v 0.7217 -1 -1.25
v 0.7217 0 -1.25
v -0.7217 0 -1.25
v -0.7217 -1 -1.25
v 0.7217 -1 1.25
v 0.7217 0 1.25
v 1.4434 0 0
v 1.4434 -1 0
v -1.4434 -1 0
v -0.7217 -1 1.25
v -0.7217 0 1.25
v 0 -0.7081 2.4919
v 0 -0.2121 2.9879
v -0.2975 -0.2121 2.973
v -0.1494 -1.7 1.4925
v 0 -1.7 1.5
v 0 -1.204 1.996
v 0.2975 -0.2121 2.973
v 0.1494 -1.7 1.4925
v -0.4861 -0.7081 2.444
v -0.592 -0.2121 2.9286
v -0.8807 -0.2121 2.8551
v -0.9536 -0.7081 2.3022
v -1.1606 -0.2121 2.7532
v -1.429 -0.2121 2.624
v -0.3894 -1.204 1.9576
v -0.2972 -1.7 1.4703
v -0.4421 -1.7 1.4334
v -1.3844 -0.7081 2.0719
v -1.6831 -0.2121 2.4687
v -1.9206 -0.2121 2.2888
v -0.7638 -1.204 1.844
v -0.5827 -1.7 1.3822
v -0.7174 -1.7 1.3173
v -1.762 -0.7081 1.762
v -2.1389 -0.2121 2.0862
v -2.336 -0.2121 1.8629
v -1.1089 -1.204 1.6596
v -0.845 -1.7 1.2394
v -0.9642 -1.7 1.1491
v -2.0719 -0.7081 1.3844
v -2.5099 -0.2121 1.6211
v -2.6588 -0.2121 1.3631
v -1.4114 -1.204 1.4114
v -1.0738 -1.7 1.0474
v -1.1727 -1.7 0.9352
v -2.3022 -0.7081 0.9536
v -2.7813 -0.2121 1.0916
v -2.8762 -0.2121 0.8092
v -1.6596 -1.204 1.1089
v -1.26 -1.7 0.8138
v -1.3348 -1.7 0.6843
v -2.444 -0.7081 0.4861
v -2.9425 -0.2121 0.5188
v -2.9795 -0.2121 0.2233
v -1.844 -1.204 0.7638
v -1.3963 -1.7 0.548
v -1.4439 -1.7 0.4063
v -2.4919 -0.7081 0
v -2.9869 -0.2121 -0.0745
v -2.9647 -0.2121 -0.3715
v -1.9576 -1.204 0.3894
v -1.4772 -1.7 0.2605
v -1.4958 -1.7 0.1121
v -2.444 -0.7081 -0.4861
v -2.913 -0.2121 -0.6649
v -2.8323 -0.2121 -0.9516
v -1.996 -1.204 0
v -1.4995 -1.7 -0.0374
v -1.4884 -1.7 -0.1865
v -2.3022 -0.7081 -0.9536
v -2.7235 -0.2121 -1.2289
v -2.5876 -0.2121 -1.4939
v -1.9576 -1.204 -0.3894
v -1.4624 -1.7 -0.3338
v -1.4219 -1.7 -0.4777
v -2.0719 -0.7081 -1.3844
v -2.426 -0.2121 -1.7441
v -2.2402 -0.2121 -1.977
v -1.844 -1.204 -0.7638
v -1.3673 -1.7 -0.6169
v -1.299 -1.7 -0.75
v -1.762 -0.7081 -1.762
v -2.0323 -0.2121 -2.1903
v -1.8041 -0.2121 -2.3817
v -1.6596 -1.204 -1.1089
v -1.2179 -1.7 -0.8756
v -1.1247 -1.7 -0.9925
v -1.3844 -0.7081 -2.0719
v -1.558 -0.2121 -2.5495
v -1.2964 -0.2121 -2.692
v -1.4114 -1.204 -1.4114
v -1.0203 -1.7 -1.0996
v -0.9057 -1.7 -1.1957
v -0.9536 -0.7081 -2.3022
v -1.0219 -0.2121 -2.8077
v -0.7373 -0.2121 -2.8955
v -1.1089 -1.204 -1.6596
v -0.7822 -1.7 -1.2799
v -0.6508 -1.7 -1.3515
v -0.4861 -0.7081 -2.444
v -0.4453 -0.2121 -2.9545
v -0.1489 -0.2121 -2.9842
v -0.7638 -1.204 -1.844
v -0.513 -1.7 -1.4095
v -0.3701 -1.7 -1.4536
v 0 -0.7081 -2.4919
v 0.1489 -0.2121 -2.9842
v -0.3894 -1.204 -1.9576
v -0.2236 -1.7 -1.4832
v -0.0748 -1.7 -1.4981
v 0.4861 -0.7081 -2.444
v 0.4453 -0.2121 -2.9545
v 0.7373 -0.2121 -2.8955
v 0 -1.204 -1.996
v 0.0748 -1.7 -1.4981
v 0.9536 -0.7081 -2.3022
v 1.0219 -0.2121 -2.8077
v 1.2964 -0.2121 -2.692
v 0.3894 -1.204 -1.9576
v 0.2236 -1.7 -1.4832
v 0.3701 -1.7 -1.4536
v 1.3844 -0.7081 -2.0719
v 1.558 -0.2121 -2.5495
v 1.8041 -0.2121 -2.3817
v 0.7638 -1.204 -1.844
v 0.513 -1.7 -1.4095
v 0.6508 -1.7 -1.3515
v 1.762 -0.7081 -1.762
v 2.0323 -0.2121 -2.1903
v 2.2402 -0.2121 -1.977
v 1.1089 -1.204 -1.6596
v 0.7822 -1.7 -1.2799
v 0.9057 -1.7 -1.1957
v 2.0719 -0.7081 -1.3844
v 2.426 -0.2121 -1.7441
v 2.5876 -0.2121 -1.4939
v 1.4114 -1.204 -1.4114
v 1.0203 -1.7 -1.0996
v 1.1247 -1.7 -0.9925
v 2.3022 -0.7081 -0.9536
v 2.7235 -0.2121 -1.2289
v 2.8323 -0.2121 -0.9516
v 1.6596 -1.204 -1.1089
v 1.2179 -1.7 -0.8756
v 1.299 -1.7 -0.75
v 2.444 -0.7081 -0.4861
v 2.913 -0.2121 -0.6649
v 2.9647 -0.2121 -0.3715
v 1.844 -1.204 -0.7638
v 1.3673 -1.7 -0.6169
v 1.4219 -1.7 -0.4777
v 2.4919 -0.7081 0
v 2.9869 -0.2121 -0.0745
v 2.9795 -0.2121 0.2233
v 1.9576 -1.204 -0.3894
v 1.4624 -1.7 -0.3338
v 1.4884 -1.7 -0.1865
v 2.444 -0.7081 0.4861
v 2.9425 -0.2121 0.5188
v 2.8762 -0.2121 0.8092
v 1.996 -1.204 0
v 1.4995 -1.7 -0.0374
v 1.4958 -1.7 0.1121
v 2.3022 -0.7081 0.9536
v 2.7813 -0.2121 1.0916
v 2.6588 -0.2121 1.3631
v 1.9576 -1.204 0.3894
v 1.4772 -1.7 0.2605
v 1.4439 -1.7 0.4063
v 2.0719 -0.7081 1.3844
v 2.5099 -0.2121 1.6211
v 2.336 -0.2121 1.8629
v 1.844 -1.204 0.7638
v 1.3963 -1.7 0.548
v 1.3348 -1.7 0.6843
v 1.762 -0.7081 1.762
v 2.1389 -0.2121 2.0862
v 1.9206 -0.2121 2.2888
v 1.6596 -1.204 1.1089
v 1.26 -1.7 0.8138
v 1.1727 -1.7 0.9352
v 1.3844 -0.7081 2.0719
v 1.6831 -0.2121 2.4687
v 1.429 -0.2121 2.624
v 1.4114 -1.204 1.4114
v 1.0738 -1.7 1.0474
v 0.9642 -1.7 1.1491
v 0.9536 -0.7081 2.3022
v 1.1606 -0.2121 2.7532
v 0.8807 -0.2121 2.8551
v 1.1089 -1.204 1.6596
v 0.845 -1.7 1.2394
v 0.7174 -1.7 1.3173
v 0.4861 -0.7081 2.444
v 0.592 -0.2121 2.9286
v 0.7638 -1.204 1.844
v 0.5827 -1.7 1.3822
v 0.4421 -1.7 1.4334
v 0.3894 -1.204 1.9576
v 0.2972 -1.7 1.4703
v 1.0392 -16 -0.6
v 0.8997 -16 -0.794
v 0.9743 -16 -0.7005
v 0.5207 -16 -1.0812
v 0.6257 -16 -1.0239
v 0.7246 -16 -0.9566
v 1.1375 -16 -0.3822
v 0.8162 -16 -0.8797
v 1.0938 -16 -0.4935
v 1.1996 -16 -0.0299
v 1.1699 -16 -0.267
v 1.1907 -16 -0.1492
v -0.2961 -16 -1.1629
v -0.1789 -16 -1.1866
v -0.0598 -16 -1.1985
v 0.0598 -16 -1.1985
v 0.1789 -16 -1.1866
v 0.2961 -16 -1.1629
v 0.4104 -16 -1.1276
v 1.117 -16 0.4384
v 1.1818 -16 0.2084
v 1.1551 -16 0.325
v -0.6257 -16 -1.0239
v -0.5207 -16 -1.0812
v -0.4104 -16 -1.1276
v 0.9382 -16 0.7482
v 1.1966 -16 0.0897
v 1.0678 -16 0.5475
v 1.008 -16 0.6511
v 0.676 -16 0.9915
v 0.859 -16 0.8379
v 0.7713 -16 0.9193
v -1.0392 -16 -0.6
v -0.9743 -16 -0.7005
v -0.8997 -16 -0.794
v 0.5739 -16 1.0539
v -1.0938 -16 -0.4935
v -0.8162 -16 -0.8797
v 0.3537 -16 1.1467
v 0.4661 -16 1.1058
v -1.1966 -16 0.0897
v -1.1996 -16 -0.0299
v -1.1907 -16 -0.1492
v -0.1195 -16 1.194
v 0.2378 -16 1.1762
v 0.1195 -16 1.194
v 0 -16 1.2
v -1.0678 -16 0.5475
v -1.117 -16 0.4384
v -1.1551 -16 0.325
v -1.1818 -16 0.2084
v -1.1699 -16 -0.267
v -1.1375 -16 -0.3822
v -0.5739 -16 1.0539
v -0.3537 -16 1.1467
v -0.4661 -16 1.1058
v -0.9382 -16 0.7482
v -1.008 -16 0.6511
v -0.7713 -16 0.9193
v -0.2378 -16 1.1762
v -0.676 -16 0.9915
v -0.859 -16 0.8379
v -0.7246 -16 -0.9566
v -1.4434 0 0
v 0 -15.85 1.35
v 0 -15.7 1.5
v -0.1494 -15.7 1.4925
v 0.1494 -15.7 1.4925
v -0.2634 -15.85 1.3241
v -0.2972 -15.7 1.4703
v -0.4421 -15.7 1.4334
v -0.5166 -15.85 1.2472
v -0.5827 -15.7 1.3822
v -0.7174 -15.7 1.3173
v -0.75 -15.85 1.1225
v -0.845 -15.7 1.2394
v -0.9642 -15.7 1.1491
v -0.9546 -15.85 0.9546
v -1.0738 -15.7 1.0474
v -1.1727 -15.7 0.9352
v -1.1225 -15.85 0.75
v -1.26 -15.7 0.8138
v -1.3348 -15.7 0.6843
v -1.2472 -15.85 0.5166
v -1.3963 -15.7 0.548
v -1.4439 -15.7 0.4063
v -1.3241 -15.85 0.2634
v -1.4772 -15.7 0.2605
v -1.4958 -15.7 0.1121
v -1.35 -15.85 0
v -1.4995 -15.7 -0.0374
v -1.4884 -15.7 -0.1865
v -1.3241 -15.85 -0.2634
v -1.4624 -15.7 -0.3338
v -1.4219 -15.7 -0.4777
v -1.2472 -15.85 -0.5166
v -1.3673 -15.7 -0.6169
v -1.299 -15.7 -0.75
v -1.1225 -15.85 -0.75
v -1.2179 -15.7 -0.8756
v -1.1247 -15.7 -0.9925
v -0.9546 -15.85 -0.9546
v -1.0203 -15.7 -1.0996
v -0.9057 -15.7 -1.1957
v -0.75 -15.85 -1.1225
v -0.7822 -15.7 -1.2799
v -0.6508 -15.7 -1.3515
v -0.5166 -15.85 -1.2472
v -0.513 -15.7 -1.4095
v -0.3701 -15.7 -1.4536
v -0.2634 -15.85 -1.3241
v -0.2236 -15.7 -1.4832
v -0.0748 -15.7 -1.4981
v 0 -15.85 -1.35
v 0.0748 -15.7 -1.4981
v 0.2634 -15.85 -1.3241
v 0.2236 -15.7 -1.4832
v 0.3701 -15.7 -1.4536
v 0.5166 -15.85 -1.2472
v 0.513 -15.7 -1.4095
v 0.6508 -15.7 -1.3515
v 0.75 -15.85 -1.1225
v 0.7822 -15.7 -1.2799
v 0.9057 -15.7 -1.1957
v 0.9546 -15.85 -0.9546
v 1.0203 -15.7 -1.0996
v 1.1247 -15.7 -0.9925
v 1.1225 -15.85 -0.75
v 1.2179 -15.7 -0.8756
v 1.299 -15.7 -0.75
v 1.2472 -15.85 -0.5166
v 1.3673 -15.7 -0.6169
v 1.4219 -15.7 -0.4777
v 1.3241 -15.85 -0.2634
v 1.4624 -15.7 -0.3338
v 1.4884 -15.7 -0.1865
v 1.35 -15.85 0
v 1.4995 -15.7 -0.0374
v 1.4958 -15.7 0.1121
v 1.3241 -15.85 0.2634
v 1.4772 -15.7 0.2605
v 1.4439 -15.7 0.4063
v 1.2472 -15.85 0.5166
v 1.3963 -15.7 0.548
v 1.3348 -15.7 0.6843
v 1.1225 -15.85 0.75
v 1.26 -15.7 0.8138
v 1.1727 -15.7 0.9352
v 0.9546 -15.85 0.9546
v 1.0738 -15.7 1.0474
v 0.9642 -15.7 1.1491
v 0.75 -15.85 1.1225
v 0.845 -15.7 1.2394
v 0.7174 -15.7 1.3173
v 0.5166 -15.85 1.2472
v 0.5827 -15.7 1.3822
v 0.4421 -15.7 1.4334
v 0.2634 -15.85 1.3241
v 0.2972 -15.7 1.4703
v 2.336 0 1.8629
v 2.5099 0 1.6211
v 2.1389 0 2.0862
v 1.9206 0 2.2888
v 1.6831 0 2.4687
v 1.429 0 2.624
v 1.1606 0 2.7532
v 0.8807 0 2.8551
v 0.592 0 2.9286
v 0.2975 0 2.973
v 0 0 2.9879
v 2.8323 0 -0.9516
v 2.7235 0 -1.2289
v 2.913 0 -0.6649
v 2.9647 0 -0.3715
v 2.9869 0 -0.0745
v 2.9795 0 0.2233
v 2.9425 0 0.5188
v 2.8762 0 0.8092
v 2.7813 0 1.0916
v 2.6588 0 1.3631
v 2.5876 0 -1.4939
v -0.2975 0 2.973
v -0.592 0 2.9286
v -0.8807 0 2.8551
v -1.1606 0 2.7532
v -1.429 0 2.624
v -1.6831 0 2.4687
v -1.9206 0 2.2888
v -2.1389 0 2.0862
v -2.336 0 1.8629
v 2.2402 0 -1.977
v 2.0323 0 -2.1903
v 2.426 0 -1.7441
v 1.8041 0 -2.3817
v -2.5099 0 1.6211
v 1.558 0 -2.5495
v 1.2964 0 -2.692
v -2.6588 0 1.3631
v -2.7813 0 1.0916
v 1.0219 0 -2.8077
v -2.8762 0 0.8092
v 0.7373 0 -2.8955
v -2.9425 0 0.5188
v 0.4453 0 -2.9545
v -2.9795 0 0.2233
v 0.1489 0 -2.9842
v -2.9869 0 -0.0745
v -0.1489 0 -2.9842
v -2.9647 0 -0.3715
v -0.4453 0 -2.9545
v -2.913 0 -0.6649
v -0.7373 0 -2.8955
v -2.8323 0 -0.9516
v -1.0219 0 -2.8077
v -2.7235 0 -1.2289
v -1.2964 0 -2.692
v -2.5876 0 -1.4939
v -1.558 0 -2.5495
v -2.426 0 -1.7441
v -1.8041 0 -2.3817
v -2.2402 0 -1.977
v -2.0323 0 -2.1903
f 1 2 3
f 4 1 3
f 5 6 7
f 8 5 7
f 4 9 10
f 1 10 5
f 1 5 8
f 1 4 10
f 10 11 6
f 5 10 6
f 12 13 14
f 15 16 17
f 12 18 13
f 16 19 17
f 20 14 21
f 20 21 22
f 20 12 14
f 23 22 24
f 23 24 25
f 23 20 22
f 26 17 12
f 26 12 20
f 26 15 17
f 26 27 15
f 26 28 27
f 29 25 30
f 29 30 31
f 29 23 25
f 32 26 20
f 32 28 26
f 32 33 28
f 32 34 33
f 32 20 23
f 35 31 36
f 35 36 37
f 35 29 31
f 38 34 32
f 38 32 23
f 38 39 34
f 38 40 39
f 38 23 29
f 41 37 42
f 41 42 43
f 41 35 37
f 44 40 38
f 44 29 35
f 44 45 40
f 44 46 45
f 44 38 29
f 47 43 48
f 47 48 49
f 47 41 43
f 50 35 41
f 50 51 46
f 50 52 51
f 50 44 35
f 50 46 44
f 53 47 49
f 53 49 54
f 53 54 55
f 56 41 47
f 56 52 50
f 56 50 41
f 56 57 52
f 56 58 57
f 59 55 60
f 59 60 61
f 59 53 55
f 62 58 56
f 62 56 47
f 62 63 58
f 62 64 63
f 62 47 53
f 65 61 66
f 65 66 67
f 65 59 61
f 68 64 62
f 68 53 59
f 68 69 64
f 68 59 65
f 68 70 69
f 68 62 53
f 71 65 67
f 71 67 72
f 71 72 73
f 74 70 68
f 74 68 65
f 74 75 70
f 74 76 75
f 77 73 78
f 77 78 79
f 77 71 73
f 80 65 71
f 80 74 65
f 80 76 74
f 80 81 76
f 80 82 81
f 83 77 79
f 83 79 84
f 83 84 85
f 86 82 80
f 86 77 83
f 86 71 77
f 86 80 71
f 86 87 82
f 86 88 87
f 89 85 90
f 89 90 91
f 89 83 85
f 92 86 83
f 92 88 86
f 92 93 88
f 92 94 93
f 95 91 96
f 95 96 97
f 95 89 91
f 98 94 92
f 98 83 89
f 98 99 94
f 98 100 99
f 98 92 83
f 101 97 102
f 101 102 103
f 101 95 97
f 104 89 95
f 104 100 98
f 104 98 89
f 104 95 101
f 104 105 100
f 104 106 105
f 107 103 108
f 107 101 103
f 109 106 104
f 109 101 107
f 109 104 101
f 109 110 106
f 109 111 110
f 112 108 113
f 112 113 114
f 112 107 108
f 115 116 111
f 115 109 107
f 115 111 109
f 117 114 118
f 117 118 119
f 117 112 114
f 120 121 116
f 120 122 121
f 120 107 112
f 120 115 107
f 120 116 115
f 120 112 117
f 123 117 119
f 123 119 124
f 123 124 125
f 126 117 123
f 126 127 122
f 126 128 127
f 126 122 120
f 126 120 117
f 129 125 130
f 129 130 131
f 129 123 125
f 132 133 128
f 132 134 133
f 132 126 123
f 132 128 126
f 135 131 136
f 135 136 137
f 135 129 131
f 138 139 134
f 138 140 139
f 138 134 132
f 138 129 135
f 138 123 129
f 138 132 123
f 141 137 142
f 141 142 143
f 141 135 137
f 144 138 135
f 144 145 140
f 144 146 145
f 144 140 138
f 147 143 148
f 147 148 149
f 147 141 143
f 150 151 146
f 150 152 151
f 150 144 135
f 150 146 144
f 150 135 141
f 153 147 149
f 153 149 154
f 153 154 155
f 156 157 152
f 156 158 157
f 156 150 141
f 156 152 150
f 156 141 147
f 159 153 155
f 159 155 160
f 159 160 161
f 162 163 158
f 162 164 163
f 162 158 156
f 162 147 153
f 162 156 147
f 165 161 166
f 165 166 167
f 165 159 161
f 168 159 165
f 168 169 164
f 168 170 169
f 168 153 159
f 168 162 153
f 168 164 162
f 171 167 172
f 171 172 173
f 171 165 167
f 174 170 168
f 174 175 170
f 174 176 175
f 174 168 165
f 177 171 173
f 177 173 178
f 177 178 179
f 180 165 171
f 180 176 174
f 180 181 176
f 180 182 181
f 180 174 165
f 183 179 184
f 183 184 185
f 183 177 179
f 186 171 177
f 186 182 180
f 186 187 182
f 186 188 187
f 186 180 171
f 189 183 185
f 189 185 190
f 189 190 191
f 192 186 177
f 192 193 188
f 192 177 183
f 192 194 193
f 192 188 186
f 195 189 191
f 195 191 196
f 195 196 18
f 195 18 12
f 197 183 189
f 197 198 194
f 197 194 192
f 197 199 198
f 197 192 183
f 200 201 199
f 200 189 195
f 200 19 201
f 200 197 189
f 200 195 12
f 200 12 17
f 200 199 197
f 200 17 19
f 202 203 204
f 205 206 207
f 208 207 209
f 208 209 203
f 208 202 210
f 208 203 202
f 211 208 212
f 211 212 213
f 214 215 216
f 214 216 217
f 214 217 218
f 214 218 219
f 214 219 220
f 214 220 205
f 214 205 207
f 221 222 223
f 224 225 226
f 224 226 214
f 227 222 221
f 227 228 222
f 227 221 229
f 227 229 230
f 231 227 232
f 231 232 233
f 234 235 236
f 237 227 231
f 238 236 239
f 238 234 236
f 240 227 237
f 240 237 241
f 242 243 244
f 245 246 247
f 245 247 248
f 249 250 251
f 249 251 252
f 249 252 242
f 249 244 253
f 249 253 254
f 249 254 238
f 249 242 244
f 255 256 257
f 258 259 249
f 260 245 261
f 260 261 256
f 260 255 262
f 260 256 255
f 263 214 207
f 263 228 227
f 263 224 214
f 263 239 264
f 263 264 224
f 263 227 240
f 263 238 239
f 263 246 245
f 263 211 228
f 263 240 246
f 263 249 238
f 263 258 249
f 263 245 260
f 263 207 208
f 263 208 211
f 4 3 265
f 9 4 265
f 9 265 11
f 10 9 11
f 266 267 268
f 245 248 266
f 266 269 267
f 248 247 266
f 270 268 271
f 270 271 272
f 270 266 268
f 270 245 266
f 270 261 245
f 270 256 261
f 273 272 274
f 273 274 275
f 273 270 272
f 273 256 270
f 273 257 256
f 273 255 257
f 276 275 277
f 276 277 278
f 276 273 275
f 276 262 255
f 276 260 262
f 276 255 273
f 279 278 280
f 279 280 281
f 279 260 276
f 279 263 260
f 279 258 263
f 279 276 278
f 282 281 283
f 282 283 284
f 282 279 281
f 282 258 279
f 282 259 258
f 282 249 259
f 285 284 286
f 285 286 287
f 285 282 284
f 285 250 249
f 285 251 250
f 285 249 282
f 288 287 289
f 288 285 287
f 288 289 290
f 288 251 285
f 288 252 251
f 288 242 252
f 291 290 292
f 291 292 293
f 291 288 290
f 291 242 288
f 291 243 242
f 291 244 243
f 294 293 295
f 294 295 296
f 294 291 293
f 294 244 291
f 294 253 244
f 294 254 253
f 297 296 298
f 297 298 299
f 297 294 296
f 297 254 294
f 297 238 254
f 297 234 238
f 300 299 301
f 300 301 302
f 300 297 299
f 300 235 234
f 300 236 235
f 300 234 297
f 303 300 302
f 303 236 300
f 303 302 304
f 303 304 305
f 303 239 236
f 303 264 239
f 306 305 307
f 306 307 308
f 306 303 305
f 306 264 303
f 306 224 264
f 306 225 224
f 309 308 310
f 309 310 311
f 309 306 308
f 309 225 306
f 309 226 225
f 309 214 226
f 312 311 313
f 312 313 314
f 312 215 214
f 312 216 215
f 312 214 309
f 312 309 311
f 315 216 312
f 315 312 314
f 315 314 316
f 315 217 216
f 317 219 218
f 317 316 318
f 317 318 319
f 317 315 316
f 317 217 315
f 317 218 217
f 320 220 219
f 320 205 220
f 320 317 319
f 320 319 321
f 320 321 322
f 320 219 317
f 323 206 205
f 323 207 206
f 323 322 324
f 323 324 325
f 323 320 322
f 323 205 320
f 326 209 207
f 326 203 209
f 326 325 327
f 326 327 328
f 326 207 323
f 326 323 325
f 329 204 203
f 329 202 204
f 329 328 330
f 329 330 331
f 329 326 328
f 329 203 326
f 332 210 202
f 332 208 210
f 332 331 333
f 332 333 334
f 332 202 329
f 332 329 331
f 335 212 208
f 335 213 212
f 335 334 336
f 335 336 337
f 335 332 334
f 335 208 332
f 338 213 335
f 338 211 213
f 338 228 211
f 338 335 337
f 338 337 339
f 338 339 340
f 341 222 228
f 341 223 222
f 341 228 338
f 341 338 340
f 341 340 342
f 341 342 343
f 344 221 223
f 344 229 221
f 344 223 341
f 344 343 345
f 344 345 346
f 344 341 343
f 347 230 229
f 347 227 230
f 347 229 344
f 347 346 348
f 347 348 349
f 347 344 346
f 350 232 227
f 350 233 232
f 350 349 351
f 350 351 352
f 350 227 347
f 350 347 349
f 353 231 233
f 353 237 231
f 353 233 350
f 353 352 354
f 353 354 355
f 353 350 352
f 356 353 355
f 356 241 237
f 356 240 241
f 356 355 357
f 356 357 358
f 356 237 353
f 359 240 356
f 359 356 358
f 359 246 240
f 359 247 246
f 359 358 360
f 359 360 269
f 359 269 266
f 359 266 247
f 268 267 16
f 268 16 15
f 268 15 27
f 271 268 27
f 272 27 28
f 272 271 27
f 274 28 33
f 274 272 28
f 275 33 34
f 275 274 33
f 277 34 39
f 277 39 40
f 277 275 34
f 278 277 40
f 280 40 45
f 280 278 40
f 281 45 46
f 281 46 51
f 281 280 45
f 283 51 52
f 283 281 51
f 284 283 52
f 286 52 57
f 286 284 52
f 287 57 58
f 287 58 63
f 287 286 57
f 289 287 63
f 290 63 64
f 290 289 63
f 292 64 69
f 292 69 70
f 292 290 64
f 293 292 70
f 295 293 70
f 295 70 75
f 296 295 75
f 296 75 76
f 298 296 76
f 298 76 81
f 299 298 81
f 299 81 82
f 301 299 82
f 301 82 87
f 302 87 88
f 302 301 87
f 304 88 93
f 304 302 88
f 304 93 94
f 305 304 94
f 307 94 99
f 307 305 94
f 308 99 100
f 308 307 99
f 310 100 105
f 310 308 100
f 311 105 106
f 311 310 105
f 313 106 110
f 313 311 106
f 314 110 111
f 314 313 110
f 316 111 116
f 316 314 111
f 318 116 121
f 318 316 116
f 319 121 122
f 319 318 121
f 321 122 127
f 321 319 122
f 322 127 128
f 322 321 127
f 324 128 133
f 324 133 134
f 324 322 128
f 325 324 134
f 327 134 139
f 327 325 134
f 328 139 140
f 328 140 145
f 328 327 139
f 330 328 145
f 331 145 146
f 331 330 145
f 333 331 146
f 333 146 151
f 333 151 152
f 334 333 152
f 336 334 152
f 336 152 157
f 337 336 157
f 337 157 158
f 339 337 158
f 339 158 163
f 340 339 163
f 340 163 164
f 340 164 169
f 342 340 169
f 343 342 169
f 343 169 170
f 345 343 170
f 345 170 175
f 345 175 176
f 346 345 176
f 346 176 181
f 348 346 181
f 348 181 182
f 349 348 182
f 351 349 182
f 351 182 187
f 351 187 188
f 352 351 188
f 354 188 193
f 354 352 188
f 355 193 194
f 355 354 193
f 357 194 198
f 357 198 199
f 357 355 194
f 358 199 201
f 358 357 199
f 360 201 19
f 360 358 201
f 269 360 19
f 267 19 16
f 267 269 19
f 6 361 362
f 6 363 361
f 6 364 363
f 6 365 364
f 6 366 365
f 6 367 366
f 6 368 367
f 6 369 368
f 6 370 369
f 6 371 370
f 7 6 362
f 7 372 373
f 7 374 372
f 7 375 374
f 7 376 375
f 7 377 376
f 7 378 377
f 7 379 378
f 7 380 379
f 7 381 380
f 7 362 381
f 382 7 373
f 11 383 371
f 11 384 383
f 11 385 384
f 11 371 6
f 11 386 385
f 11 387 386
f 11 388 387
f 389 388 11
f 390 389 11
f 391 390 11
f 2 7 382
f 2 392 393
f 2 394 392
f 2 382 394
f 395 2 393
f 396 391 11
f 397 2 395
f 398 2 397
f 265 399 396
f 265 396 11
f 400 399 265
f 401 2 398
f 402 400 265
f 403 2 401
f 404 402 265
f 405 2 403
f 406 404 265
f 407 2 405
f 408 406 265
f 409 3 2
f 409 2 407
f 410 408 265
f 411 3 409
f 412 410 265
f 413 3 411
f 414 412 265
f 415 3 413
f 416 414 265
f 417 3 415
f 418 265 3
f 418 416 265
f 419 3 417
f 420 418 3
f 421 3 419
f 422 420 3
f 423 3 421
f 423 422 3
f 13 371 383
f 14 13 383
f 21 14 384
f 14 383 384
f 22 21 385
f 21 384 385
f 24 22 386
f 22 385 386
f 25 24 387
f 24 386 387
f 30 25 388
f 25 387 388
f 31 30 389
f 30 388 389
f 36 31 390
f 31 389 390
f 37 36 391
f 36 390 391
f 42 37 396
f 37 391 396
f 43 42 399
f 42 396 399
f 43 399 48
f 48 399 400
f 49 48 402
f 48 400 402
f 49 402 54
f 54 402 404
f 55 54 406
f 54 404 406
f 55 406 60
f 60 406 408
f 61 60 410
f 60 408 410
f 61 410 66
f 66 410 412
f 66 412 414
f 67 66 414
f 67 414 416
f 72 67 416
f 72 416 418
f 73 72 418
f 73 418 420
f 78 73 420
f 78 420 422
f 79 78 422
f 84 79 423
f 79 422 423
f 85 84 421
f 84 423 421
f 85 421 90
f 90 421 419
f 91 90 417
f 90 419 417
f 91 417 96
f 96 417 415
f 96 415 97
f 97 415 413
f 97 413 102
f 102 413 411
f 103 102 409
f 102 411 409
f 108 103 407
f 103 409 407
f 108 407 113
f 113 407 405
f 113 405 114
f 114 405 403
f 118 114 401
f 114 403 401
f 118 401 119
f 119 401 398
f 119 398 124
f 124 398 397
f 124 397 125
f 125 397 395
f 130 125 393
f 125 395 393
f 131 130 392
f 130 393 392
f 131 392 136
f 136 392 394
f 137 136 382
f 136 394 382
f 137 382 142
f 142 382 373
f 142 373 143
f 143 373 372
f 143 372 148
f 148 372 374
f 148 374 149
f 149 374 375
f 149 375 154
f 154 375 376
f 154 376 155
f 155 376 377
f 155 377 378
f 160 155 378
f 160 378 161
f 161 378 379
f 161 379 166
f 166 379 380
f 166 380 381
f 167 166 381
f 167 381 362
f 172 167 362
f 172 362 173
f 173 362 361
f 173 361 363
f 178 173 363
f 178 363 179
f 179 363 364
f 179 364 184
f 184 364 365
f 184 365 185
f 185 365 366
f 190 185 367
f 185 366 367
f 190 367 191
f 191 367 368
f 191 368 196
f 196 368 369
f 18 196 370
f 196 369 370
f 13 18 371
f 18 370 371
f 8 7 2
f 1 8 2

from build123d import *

# Parameters (mm, degrees)
CHAFL_N2_SIZE         = 0.3
CHAFL_N2_SIZE2        = 0.212132034
CHAFL_N3_SIZE         = 0.3
CORTAR_EXTRUIR2_DEPTH = 1


with BuildPart() as part:
    # Croquis1 → Revolución1 (revolve)
    with BuildSketch(Plane.XY, mode=Mode.PRIVATE) as revoluci_n1_sk:
        Polygon((0, 0), (3.2, 0), (1.5, -1.7), (1.5, -16), (0, -16), align=None)
    revolve(revoluci_n1_sk.sketch.rotate(Axis((0, 0, 0), (0, -1, 0)), 90), axis=Axis((0, 0, 0), (0, -1, 0)))

    # Chaflán2
    chafl_n2_edges = [part.edges().sort_by_distance(p)[0] for p in [
        (0, 0, -3.2),
    ]]
    chafl_n2_side = [part.faces().sort_by_distance(p)[0] for p in [
        (0, -0.85, -2.35),
    ]]
    chamfer(chafl_n2_edges, length=CHAFL_N2_SIZE, length2=CHAFL_N2_SIZE2, reference=chafl_n2_side[0])

    # Chaflán3
    chafl_n3_edges = [part.edges().sort_by_distance(p)[0] for p in [
        (0, -16, -1.5),
    ]]
    chamfer(chafl_n3_edges, length=CHAFL_N3_SIZE)

    # Croquis3 → Cortar-Extruir2 (cut)
    with BuildSketch(Plane(origin=(0, 0, 0), x_dir=(1, 0, 0), z_dir=(0, 1, 0))):
        Polygon((-0.721687836, 1.25), (-1.443375673, 0), (-0.721687836, -1.25), (0.721687836, -1.25), (1.443375673, 0), (0.721687836, 1.25), align=None)
    extrude(amount=-CORTAR_EXTRUIR2_DEPTH, mode=Mode.SUBTRACT)


solid = part.part
